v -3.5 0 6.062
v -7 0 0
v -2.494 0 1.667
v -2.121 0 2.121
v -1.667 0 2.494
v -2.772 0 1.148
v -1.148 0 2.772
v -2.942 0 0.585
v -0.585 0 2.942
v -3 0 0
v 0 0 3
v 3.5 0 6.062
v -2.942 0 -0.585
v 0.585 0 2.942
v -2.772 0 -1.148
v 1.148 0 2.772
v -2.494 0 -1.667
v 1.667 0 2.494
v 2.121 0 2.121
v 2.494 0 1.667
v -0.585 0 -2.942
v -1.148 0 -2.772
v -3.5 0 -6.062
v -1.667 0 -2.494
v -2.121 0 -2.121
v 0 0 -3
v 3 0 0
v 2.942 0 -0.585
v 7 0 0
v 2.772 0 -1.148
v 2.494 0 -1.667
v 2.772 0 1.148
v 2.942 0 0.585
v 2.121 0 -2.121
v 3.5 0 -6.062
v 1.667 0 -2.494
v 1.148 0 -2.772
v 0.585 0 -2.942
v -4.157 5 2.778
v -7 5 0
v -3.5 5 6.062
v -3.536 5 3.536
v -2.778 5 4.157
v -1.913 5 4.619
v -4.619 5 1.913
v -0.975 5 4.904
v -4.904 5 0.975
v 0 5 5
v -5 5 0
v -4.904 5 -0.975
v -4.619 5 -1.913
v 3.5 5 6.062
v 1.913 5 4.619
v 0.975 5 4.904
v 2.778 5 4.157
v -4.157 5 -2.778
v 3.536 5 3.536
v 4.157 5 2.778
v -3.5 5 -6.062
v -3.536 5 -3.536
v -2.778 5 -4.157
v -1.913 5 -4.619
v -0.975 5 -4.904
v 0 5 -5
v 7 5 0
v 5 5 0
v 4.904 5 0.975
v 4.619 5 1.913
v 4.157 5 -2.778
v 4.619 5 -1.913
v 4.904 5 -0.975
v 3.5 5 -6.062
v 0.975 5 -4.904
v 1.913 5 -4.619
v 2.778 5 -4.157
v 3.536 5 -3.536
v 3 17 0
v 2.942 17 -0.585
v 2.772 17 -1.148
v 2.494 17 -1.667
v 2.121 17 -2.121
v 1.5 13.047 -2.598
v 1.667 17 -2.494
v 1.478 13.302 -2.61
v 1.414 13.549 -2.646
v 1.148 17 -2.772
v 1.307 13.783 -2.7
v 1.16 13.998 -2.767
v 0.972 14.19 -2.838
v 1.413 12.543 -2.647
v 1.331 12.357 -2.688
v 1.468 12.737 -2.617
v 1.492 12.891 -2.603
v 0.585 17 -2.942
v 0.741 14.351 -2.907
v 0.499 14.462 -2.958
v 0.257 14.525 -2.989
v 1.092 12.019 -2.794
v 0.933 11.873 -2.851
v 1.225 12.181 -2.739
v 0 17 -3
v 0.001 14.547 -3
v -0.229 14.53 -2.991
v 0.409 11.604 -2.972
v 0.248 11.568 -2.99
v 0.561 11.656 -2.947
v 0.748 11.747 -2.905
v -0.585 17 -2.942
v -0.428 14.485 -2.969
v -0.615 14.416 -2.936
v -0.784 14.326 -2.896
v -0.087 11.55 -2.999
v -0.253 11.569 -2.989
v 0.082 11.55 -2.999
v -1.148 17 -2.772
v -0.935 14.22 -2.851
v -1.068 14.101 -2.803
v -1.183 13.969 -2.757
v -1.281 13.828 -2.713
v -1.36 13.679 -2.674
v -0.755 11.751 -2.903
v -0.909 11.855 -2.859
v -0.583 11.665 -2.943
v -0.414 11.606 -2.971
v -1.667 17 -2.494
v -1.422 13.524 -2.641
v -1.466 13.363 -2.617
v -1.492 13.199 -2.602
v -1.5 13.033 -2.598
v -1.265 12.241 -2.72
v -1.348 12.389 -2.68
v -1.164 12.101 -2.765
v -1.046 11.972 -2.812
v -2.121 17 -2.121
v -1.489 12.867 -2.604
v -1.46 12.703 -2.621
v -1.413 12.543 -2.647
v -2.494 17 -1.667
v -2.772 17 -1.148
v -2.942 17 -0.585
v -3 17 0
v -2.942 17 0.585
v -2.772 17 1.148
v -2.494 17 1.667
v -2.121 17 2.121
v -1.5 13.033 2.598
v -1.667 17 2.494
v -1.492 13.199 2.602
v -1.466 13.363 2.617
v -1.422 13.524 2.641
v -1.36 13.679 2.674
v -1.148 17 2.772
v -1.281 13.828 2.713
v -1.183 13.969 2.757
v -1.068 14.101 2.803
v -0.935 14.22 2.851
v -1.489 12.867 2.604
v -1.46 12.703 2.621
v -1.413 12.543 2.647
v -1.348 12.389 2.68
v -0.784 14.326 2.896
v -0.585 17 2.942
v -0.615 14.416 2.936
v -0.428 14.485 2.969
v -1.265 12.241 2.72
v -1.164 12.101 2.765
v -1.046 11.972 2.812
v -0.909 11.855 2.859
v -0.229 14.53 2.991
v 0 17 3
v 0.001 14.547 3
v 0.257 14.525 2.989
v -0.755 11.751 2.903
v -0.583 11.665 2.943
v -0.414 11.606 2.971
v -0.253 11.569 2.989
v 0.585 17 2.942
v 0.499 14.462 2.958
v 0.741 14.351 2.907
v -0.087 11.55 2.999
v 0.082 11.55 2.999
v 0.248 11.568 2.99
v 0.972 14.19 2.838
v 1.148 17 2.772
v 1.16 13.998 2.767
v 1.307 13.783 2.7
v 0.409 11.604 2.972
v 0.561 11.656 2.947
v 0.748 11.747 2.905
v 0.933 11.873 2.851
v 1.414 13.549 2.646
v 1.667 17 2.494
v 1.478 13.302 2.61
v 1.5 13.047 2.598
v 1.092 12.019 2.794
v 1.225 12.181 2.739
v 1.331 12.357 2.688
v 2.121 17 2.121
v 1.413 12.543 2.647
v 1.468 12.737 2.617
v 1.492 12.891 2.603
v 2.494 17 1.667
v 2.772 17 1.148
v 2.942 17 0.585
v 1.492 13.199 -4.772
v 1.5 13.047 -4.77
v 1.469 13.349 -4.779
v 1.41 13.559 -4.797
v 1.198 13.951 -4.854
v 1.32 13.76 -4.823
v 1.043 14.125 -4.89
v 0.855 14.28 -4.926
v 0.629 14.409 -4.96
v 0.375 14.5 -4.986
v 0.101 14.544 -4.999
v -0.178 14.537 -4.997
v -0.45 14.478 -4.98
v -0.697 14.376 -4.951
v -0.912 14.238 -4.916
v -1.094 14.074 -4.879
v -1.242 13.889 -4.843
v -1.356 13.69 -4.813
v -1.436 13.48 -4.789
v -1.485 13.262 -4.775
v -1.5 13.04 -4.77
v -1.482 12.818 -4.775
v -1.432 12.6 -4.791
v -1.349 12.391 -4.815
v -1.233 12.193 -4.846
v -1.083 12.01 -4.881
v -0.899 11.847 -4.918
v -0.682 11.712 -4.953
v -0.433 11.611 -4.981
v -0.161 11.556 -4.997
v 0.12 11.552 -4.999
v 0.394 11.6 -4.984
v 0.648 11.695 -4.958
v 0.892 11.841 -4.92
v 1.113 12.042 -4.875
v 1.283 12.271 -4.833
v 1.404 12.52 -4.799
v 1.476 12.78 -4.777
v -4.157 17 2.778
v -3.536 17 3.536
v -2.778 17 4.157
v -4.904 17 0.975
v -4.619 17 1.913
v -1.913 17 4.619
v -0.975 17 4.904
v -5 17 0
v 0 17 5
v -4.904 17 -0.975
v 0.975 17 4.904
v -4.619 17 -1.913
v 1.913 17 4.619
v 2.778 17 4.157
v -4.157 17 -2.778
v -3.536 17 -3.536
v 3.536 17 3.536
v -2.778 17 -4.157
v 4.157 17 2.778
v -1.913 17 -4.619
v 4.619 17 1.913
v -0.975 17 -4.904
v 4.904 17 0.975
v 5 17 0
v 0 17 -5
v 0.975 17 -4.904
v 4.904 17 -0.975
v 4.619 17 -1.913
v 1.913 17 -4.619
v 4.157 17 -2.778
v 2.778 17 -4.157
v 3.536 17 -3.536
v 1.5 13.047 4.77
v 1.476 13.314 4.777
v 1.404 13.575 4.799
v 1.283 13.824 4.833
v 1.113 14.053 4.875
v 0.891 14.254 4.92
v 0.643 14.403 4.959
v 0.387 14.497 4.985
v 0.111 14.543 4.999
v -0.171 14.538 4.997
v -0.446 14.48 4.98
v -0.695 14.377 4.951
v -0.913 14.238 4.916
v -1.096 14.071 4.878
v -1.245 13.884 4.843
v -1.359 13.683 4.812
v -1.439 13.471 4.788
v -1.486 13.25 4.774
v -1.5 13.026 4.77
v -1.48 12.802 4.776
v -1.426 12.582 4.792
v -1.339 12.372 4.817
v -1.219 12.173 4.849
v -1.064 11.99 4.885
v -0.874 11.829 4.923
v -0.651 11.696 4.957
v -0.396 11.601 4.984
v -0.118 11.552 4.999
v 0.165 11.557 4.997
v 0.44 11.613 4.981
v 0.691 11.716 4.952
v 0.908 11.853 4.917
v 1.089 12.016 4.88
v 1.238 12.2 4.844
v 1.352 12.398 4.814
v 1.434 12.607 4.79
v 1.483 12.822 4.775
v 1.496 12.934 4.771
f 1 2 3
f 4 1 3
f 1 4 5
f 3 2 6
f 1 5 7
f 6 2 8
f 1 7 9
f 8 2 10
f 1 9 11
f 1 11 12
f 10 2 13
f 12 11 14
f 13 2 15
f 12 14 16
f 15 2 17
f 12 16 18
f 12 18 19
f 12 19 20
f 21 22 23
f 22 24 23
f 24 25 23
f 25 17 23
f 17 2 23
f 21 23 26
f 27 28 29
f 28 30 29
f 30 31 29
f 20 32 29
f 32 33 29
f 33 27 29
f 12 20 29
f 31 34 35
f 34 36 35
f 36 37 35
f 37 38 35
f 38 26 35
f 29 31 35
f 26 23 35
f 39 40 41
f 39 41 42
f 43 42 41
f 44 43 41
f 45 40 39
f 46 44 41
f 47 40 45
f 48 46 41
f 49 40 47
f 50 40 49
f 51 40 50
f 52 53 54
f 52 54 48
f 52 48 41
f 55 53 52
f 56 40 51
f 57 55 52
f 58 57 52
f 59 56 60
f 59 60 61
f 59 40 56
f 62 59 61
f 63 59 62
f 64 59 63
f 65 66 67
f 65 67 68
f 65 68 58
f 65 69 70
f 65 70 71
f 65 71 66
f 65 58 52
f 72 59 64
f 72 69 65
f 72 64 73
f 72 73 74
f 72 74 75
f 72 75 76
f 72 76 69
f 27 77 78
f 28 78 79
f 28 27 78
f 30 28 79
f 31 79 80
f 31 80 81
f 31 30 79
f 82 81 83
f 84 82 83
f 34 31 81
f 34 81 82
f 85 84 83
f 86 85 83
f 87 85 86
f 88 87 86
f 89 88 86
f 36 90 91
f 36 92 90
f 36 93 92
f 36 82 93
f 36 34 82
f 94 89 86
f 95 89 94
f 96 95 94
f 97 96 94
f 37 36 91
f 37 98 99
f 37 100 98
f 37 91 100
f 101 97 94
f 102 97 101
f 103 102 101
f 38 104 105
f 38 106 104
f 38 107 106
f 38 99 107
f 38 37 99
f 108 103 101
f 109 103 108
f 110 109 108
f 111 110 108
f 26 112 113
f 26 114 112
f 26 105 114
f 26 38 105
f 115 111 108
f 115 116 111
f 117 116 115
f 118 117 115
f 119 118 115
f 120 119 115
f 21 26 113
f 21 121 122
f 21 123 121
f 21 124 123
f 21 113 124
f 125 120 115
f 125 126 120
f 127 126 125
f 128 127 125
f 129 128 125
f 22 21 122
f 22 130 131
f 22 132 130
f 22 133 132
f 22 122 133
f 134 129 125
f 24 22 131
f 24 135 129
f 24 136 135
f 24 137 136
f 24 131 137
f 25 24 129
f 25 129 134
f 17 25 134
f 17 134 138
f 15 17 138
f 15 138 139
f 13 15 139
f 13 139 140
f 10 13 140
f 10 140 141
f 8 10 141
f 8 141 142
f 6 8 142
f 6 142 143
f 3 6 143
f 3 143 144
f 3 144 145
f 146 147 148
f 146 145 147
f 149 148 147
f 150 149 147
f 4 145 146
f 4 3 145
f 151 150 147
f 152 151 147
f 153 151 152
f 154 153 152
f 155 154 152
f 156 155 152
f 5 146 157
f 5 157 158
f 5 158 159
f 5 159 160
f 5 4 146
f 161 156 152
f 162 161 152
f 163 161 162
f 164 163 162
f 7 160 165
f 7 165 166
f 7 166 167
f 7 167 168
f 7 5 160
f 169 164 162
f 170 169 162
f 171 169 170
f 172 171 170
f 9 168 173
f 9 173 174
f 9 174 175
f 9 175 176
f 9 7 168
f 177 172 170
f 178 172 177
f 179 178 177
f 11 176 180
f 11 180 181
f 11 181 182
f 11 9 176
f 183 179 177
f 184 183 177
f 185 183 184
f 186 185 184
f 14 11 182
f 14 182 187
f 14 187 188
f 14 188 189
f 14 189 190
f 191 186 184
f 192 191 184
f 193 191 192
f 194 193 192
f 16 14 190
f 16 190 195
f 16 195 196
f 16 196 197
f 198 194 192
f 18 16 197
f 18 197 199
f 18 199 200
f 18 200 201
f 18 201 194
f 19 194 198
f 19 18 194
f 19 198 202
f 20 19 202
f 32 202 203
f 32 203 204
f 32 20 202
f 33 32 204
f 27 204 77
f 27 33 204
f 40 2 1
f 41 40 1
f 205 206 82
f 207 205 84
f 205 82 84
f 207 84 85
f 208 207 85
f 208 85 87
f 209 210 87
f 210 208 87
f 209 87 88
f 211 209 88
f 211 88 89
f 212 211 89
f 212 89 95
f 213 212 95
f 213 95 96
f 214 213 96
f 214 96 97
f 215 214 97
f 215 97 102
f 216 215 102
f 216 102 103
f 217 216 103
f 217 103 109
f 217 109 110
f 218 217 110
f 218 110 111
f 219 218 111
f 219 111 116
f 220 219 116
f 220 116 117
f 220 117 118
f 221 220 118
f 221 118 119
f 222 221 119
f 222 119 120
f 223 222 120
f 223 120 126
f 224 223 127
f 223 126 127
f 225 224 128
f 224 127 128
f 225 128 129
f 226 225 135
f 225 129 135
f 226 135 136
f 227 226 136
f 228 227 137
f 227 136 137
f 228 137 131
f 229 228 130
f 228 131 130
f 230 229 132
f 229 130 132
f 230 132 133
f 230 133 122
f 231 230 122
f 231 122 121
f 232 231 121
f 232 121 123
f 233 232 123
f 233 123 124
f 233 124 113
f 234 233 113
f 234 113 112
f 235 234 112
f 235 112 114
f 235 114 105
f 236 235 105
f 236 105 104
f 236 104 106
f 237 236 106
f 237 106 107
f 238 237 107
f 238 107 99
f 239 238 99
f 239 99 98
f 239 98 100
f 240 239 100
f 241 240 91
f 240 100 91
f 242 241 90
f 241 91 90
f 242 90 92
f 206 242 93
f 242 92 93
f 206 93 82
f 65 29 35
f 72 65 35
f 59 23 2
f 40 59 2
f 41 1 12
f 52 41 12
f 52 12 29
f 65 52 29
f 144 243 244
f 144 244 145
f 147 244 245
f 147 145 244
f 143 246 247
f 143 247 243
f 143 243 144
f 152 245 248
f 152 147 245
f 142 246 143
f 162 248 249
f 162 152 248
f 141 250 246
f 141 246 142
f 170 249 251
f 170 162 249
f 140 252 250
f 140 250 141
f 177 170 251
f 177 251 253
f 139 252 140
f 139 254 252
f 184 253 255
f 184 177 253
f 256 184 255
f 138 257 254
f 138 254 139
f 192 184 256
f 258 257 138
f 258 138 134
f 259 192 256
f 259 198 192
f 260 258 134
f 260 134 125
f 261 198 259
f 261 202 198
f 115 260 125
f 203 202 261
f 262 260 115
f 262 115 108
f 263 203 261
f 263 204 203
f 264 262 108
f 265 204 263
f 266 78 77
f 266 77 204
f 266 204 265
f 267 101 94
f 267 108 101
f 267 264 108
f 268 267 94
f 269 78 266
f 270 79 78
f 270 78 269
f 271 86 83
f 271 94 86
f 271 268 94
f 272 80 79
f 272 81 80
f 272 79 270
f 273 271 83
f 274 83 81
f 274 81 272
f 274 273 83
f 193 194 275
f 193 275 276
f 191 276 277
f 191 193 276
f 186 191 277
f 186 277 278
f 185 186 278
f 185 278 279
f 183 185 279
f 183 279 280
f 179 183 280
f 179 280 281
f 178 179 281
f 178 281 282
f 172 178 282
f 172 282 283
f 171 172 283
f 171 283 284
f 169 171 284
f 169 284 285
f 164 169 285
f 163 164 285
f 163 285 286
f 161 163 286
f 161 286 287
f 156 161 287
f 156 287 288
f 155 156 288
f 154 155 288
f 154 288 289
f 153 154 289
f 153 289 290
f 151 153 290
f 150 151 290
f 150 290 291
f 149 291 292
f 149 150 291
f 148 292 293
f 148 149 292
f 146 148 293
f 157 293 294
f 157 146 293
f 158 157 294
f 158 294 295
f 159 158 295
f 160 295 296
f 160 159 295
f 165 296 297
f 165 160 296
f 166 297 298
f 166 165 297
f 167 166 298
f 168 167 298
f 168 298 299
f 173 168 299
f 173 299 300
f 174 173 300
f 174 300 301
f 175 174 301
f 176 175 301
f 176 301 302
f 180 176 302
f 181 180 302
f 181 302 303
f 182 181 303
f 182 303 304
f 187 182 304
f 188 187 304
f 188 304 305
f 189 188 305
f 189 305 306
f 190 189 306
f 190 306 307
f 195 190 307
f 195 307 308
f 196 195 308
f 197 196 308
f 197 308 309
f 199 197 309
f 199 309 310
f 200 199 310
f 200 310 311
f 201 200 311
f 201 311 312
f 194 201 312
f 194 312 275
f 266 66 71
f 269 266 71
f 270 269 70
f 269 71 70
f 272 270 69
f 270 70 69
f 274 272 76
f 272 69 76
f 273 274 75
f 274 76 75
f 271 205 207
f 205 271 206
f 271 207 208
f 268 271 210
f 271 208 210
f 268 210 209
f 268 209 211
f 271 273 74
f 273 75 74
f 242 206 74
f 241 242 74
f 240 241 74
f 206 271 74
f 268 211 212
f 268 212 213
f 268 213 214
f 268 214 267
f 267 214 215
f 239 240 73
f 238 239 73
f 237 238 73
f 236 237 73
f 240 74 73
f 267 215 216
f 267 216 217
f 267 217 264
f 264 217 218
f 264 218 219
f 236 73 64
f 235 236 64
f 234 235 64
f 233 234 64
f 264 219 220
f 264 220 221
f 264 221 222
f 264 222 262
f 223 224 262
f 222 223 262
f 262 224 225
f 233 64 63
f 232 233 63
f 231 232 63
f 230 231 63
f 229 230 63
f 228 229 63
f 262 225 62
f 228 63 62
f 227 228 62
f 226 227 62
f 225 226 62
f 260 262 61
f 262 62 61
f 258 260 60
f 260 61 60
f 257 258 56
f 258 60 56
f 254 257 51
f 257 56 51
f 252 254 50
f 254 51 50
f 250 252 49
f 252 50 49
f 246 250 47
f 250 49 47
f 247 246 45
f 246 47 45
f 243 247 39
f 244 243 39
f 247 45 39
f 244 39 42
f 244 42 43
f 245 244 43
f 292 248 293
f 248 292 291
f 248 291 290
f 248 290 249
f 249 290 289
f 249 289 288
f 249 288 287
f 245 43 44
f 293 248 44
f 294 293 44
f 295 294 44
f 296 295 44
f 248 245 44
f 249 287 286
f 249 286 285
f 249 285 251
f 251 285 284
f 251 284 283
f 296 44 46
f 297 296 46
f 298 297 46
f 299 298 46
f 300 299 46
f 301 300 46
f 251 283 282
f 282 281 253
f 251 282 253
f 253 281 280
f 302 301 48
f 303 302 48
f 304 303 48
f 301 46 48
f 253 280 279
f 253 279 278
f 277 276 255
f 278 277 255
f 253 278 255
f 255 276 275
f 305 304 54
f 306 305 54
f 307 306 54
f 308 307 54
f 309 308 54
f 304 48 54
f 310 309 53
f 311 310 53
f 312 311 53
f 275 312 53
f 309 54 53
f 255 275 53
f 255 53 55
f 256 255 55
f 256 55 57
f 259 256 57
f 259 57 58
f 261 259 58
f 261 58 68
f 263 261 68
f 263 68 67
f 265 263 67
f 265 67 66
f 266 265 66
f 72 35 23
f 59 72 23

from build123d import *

# Parameters (mm, degrees)
EXTRUDE_1_DEPTH          = 5
SKETCH_3_R               = 5
EXTRUDE_2_DEPTH          = 17
SKETCH_4_R               = 3
CUT_EXTRUDE_1_DEPTH      = 17
SKETCH_6_R               = 1.5
CUT_EXTRUDE_2_DEPTH      = 5
CUT_EXTRUDE_2_DEPTH_BACK = 5


with BuildPart() as part:
    # 草图1 → 凸台-拉伸1 (new body)
    with BuildSketch(Plane(origin=(0, 0, 0), x_dir=(1, 0, 0), z_dir=(0, 1, 0))):
        Polygon((-7, 0), (-3.5, -6.062177826), (3.5, -6.062177826), (7, 0), (3.5, 6.062177826), (-3.5, 6.062177826), align=None)
    extrude(amount=EXTRUDE_1_DEPTH)

    # 草图3 → 凸台-拉伸2 (add)
    with BuildSketch(Plane(origin=(0, 0, 0), x_dir=(1, 0, 0), z_dir=(0, 1, 0))):
        Circle(SKETCH_3_R)
    extrude(amount=EXTRUDE_2_DEPTH)

    # 草图4 → 切除-拉伸1 (cut)
    with BuildSketch(Plane(origin=(0, 0, 0), x_dir=(1, 0, 0), z_dir=(0, 1, 0))):
        Circle(SKETCH_4_R)
    extrude(amount=CUT_EXTRUDE_1_DEPTH, mode=Mode.SUBTRACT)

    # 草图6 → 切除-拉伸2 (cut, two sides)
    with BuildSketch(Plane.XY) as cut_extrude_2_sk:
        with Locations((0, 13.047463788)):
            Circle(SKETCH_6_R)
    extrude(amount=CUT_EXTRUDE_2_DEPTH, mode=Mode.SUBTRACT)
    extrude(cut_extrude_2_sk.sketch, amount=-CUT_EXTRUDE_2_DEPTH_BACK, mode=Mode.SUBTRACT)


solid = part.part
